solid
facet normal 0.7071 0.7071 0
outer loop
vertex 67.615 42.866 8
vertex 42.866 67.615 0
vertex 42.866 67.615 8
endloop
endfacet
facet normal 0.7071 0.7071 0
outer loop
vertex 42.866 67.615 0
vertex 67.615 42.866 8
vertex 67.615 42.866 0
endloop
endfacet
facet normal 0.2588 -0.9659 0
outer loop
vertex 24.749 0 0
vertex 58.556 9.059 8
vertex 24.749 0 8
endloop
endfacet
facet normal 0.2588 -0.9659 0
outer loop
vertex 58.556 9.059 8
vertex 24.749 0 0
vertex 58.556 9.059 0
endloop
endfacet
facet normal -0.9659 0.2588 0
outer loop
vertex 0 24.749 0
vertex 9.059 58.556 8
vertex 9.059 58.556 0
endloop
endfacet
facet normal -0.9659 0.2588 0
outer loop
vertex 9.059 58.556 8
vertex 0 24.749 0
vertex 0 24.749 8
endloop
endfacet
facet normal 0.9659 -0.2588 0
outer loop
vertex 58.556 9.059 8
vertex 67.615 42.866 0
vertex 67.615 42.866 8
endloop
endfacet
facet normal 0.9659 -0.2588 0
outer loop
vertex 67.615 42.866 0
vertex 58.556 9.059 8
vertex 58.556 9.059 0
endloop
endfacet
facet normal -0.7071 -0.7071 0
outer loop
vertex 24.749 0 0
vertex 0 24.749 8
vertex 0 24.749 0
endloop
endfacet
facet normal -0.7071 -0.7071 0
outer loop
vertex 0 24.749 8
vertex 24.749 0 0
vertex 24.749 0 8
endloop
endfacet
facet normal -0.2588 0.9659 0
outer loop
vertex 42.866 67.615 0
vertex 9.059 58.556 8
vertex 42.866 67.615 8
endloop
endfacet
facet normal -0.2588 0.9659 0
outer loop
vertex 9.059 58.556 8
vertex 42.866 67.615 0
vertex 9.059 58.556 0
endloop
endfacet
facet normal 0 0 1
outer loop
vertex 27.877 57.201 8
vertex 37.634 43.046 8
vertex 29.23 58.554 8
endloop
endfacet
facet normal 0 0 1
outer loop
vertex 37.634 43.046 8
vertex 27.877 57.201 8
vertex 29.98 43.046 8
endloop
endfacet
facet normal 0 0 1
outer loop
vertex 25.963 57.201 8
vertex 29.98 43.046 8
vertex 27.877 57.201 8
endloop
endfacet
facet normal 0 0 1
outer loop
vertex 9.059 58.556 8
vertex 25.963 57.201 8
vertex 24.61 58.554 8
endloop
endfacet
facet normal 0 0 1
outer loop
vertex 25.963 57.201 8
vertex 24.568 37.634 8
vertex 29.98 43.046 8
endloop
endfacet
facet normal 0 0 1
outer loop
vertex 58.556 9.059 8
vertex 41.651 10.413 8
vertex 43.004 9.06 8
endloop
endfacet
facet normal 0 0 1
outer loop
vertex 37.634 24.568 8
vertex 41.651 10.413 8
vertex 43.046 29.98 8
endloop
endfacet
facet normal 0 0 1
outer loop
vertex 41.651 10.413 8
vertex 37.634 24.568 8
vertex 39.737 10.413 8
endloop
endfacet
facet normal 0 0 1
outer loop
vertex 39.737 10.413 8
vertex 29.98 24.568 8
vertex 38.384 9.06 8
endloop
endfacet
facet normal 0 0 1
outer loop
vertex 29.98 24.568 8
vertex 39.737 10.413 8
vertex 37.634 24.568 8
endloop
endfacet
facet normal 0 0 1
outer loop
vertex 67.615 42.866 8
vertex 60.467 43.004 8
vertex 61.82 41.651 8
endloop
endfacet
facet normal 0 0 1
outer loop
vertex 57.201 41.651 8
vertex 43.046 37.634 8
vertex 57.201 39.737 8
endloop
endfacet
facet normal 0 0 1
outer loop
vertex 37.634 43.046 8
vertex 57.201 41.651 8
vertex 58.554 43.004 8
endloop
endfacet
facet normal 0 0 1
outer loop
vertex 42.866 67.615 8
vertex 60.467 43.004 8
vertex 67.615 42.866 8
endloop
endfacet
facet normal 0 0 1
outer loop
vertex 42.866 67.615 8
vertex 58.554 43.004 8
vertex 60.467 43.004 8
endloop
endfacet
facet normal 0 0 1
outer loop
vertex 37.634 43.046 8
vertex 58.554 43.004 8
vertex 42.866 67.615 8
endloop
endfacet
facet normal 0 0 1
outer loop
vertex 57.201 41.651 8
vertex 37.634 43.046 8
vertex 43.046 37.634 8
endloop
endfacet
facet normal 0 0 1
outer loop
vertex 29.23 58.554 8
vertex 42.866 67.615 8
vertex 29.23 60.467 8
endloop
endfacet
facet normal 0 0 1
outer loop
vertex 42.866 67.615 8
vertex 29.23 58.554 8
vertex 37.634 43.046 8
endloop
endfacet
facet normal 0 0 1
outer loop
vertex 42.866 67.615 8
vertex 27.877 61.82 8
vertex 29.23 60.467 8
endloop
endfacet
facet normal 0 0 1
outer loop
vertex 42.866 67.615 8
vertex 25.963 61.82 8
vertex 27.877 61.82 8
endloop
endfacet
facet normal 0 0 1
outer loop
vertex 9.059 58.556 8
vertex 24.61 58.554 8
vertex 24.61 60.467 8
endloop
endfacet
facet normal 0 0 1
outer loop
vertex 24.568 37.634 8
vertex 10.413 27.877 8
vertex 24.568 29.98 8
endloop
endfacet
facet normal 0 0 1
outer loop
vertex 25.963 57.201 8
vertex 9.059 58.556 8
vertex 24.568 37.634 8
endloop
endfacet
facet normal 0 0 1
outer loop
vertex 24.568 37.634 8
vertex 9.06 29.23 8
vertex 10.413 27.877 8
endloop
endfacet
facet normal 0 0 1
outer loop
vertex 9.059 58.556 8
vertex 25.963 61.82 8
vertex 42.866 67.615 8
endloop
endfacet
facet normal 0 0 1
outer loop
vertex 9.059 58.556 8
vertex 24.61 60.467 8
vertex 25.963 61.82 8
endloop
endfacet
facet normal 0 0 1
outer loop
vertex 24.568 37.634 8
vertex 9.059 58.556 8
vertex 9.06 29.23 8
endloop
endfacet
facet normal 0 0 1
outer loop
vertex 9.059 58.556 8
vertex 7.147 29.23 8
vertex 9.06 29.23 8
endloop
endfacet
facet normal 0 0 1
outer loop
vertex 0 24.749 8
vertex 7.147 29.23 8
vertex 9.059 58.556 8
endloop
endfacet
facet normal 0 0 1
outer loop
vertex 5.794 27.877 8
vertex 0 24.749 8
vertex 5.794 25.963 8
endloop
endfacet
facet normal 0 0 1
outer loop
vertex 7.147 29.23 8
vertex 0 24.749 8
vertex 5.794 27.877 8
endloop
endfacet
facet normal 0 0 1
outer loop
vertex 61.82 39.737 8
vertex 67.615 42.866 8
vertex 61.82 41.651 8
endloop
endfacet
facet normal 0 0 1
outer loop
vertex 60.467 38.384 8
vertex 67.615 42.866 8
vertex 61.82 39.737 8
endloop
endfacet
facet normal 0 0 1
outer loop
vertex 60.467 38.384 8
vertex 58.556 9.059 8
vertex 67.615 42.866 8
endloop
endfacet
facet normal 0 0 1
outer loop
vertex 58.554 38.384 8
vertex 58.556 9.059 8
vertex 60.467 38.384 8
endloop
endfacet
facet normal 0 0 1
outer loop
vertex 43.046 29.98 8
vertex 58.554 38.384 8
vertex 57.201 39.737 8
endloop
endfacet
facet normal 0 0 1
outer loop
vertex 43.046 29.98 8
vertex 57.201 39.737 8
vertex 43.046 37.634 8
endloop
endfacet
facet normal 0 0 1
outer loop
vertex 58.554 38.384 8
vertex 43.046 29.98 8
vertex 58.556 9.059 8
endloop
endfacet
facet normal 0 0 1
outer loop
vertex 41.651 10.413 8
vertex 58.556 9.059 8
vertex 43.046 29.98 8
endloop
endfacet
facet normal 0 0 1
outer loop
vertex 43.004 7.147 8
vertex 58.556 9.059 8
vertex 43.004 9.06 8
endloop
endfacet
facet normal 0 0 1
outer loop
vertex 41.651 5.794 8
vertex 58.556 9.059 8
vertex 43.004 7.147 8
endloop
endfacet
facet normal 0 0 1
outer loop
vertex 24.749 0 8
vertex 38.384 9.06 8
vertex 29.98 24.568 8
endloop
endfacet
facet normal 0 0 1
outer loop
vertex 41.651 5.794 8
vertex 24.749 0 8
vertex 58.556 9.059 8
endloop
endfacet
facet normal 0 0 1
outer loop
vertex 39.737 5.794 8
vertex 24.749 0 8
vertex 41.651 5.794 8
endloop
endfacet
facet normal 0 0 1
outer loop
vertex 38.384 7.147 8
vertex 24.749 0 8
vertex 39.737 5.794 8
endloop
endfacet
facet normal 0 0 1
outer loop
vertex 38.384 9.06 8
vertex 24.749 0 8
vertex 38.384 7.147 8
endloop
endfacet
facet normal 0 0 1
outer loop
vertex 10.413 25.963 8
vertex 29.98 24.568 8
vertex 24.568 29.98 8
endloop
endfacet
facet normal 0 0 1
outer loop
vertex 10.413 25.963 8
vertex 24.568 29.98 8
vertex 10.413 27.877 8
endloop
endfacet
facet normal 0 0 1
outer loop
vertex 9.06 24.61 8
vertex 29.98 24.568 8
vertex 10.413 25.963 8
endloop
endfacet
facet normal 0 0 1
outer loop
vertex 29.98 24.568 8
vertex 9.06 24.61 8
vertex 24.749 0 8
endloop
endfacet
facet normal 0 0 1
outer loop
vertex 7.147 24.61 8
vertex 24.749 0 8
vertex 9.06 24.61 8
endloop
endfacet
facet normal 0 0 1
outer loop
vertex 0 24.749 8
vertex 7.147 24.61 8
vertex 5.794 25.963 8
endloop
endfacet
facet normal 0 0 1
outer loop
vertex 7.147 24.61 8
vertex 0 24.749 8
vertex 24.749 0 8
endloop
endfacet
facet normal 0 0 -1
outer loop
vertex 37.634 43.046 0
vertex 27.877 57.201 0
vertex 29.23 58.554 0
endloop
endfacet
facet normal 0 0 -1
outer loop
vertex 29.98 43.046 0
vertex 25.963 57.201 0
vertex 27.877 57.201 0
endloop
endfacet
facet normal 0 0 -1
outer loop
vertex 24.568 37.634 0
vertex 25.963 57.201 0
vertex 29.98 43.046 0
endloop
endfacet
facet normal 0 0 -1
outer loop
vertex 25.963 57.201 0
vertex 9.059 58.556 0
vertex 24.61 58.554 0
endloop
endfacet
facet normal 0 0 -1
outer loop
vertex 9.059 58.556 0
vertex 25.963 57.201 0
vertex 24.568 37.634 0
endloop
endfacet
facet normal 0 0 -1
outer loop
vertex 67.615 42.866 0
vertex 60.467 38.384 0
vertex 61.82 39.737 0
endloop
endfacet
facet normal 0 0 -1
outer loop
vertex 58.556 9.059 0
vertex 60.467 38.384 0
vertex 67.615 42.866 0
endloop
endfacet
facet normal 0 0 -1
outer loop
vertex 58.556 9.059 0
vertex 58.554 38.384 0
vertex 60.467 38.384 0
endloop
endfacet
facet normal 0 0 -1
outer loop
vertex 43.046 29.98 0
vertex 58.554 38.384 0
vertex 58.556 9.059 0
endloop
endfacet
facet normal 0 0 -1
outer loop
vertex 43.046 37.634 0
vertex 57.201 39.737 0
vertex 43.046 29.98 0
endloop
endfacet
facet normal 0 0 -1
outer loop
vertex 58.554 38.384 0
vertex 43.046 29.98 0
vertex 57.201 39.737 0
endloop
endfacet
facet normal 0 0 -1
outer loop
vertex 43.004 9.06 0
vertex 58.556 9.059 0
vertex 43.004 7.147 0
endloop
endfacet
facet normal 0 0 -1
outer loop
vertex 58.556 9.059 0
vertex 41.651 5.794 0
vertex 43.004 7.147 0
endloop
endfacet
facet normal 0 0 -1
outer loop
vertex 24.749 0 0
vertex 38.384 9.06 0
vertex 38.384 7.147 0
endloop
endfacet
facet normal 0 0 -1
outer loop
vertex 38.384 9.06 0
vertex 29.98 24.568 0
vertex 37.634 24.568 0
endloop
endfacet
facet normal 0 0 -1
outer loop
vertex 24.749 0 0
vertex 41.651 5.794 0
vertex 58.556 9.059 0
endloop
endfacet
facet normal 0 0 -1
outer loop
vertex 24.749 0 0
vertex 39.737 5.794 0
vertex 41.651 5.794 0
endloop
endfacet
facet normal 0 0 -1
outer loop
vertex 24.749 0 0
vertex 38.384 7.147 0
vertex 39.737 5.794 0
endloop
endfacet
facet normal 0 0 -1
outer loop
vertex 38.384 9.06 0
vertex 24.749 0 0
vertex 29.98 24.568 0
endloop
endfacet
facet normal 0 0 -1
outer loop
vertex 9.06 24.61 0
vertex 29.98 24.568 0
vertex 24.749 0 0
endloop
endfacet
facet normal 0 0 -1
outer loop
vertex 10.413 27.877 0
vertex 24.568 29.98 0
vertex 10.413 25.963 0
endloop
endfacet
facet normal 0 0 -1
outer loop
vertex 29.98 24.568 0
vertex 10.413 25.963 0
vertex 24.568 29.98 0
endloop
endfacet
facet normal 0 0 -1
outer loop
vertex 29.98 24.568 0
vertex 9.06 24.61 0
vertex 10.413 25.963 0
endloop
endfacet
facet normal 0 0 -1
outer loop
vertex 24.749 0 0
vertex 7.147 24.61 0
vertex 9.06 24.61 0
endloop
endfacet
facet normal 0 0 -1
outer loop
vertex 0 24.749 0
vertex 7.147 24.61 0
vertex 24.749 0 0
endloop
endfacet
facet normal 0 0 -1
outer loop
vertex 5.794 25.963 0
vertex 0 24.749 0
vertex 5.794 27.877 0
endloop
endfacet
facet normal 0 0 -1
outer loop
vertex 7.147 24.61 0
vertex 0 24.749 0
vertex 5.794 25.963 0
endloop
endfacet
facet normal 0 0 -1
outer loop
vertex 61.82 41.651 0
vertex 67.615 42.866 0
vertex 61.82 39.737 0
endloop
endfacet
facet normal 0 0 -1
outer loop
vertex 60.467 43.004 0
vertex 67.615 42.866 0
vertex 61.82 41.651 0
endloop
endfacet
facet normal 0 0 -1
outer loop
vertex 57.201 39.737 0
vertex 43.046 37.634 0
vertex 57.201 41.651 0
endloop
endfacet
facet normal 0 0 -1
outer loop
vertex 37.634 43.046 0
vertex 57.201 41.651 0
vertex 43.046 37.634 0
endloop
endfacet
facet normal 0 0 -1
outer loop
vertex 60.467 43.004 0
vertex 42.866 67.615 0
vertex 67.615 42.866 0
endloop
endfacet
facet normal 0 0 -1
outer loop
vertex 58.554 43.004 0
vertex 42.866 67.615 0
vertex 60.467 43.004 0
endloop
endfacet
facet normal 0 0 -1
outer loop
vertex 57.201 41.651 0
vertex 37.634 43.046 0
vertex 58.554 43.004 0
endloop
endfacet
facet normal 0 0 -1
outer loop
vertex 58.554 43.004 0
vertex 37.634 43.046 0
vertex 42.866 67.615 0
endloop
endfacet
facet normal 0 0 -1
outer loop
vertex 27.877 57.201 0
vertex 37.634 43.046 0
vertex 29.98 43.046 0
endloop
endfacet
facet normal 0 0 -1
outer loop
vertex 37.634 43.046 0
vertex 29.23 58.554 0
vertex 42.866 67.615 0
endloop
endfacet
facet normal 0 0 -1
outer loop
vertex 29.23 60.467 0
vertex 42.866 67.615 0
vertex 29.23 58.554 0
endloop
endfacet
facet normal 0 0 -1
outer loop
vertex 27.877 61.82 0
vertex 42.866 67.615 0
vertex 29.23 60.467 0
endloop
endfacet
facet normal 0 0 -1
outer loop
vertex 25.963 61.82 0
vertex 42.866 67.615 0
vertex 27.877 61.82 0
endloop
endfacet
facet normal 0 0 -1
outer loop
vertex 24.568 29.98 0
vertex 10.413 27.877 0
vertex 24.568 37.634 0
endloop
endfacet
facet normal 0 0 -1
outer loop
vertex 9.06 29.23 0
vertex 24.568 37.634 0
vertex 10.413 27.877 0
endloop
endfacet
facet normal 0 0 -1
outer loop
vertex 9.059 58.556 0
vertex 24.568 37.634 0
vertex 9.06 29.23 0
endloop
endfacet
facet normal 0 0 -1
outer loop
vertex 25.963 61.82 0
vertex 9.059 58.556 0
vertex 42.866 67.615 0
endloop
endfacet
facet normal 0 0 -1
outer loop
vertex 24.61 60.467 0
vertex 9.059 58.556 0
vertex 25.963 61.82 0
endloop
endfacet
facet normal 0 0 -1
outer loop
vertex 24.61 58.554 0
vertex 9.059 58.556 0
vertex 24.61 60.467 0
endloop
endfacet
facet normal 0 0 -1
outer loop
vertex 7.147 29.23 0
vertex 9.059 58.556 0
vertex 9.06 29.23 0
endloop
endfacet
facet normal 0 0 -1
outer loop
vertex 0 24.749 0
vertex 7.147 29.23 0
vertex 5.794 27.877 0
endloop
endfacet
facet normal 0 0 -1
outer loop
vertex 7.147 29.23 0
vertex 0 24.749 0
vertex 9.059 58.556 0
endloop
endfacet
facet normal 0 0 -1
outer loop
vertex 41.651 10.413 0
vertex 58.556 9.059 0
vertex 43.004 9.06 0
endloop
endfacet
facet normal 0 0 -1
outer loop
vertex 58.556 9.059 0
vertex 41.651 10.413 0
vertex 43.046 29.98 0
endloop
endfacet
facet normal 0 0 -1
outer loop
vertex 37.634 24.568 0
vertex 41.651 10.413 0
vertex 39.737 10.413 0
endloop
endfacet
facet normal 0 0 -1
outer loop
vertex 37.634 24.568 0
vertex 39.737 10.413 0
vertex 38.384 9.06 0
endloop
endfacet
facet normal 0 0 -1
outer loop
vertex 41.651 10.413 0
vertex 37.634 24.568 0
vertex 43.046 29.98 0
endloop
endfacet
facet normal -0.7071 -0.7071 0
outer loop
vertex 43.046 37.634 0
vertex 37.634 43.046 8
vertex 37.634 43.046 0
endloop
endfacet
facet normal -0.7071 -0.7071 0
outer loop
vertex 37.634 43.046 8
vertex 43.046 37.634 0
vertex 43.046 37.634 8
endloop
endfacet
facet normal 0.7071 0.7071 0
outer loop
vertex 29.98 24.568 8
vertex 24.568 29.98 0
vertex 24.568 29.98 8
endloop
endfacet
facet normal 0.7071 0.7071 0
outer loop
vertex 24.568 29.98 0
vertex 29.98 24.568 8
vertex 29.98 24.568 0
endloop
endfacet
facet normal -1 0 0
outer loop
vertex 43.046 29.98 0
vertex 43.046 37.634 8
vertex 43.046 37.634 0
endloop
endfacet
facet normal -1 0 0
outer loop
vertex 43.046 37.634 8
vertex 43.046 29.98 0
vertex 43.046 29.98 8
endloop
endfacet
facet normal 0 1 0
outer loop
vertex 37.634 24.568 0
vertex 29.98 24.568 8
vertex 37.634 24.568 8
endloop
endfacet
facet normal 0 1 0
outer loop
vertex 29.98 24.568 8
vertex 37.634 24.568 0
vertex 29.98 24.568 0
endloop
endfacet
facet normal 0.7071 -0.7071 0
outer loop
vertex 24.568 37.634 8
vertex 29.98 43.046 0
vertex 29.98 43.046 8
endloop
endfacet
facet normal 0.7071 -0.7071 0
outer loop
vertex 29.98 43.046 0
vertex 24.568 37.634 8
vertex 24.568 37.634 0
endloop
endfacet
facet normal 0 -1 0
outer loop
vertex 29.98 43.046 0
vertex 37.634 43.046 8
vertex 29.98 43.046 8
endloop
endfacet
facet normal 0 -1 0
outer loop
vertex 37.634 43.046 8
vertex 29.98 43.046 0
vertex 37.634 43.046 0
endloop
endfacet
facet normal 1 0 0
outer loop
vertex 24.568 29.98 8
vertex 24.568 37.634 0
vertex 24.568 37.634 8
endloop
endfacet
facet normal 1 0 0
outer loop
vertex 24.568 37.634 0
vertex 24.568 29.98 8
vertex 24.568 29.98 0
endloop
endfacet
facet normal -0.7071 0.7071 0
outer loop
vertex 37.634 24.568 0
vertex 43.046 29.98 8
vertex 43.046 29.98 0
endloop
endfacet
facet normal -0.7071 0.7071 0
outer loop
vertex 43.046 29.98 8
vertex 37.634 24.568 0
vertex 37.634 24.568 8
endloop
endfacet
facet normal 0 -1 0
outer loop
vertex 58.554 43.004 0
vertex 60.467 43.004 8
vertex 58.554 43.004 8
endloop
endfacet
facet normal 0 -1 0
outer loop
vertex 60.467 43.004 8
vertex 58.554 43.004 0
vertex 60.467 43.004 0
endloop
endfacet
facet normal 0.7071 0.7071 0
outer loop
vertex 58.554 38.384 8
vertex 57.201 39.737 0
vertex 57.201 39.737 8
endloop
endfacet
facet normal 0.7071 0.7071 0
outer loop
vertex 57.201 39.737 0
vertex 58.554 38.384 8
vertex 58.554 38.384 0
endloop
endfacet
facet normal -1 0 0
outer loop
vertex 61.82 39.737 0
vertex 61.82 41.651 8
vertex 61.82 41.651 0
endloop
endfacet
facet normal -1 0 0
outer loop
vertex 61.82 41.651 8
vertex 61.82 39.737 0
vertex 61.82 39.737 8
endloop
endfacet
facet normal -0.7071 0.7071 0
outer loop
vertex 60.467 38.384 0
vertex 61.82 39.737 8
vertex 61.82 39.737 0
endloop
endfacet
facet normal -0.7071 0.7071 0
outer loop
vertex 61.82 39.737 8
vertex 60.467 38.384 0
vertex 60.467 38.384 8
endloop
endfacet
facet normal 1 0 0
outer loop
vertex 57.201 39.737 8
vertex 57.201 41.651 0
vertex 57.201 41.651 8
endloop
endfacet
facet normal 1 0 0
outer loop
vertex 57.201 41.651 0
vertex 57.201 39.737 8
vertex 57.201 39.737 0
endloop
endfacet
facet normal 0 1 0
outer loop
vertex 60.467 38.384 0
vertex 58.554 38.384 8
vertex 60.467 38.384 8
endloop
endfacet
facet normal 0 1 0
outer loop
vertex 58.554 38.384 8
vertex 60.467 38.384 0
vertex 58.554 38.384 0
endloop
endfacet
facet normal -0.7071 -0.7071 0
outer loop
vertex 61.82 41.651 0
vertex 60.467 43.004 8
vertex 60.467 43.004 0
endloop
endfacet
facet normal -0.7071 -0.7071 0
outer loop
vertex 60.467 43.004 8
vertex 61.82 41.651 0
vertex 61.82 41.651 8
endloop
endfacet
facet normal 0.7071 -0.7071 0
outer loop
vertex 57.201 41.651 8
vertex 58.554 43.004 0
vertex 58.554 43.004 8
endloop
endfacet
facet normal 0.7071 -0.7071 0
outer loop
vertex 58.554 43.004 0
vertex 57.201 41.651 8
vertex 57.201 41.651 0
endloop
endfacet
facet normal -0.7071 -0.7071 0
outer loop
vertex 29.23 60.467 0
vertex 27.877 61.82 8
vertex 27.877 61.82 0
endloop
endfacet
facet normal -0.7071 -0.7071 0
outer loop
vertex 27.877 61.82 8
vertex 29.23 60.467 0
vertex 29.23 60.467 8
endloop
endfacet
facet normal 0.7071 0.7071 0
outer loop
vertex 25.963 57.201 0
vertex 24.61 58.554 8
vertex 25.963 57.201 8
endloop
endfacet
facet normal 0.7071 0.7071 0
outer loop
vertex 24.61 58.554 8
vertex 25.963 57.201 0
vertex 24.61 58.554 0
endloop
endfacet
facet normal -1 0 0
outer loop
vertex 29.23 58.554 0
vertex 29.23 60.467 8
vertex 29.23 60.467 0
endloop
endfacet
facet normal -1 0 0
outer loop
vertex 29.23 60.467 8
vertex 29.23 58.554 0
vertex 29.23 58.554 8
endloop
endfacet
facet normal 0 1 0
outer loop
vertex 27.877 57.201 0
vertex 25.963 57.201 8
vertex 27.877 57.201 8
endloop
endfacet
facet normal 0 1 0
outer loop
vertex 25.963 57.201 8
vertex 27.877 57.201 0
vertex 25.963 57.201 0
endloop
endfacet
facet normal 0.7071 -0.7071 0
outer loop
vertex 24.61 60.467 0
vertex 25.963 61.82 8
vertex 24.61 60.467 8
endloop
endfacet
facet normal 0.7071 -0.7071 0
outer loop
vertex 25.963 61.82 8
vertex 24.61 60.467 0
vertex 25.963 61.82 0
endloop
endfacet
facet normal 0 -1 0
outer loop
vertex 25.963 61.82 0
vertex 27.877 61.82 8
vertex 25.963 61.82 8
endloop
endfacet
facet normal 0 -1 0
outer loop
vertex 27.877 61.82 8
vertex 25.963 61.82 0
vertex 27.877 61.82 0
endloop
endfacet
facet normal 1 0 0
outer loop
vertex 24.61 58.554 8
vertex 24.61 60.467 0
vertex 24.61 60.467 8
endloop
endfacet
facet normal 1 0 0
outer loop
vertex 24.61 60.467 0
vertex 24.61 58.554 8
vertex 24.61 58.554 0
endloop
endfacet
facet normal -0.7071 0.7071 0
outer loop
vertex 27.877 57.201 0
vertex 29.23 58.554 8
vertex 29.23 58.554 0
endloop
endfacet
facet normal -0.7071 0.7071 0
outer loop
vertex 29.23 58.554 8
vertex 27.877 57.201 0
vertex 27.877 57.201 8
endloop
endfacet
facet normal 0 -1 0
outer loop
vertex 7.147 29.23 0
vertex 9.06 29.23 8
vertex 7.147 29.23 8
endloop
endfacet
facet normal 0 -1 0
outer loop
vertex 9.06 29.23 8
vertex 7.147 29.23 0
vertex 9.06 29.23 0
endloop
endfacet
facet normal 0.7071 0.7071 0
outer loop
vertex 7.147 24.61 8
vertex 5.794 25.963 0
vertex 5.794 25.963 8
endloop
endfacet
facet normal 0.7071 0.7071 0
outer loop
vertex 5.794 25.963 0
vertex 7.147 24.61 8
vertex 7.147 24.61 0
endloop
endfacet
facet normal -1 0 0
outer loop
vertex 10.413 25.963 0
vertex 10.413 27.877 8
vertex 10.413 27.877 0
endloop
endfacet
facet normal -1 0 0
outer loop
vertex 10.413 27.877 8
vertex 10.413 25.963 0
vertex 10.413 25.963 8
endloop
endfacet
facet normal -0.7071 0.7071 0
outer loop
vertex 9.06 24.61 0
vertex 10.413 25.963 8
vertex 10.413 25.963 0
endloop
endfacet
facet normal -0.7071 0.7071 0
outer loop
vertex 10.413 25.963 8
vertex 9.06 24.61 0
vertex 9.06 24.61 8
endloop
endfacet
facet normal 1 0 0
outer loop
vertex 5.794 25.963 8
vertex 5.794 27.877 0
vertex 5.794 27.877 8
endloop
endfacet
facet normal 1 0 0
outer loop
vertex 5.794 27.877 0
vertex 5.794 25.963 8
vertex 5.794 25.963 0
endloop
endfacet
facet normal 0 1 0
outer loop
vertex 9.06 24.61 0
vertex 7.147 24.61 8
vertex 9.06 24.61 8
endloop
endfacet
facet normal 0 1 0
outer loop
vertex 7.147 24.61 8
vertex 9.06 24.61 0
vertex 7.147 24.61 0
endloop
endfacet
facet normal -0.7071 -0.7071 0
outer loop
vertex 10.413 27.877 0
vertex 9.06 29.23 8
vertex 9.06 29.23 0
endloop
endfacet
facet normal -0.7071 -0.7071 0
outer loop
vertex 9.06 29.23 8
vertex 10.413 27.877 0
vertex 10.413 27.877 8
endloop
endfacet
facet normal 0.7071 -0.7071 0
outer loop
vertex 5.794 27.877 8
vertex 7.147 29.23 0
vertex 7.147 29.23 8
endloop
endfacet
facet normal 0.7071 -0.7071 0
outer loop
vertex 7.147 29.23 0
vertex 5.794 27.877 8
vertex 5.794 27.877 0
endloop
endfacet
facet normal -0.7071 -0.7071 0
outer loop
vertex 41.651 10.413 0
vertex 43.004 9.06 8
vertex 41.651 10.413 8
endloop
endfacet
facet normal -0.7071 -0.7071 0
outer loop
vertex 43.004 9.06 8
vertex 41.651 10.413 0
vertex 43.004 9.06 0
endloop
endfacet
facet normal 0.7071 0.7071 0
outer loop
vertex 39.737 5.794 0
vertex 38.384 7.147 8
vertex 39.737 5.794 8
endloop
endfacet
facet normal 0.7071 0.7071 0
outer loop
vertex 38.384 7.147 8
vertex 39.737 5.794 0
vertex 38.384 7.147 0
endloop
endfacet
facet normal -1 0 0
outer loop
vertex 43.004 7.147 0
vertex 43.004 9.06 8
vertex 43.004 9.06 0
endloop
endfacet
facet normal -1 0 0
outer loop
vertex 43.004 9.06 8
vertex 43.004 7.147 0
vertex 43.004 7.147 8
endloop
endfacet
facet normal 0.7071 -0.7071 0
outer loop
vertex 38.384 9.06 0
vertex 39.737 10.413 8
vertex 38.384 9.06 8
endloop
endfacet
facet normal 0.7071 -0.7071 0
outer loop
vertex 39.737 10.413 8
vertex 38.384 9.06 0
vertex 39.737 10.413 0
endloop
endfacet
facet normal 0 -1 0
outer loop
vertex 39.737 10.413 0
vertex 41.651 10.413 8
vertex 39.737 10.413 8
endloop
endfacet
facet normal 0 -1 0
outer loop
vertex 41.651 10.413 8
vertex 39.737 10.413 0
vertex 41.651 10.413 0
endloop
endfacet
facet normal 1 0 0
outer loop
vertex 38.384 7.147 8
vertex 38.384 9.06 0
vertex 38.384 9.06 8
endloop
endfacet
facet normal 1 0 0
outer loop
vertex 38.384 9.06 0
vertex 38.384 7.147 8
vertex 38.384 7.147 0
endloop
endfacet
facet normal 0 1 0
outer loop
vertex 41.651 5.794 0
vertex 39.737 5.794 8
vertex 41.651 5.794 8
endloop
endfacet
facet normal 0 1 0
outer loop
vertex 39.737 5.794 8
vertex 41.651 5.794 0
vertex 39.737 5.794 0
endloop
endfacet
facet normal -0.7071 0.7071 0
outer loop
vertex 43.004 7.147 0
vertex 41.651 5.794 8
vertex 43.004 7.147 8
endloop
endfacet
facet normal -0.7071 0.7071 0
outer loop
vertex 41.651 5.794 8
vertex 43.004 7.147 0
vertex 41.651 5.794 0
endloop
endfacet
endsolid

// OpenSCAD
$fn = 32;

// ----------------------------------------------------------------------
// Polygon plate: 6-gon R35, 4 bolt windows
// ----------------------------------------------------------------------

// --- parameters (mm) ---
sides = 6;                // number of polygon sides
plate_r = 35;             // circumscribed radius of the polygon
bore_r = 10;              // centre bore radius
bolts = 4;                // number of bolt windows
ring_r = 26.61;           // bolt-circle radius
bolt_r = 2.5;             // bolt window radius
plate_t = 8;              // plate thickness, Z (extrusion height)

plate_d = 2 * plate_r;  // circumscribed diameter
bore_d = 2 * bore_r;  // centre bore diameter
bolt_d = 2 * bolt_r;  // bolt window diameter
ring_d = 2 * ring_r;  // bolt-circle diameter

profile = [[67.615, 42.866], [42.866, 67.615], [9.059, 58.556], [0, 24.749], [24.749, 0], [58.556, 9.059]];  // primary outline, 6 points, counter clockwise
void_1 = [[43.046, 37.634], [37.634, 43.046], [29.98, 43.046], [24.568, 37.634], [24.568, 29.98], [29.98, 24.568], [37.634, 24.568], [43.046, 29.98]];  // centre bore, 8 points
void_2 = [[61.82, 41.651], [60.467, 43.004], [58.554, 43.004], [57.201, 41.651], [57.201, 39.737], [58.554, 38.384], [60.467, 38.384], [61.82, 39.737]];  // bolt window 1, 8 points
void_3 = [[29.23, 60.467], [27.877, 61.82], [25.963, 61.82], [24.61, 60.467], [24.61, 58.554], [25.963, 57.201], [27.877, 57.201], [29.23, 58.554]];  // bolt window 2, 8 points
void_4 = [[10.413, 27.877], [9.06, 29.23], [7.147, 29.23], [5.794, 27.877], [5.794, 25.963], [7.147, 24.61], [9.06, 24.61], [10.413, 25.963]];  // bolt window 3, 8 points
void_5 = [[43.004, 9.06], [41.651, 10.413], [39.737, 10.413], [38.384, 9.06], [38.384, 7.147], [39.737, 5.794], [41.651, 5.794], [43.004, 7.147]];  // bolt window 4, 8 points

// --- the one profile operation ---
difference() {
  linear_extrude(height = plate_t) polygon(points = profile);
  translate([0, 0, -1])
    linear_extrude(height = plate_t + 2) polygon(points = void_1);
  translate([0, 0, -1])
    linear_extrude(height = plate_t + 2) polygon(points = void_2);
  translate([0, 0, -1])
    linear_extrude(height = plate_t + 2) polygon(points = void_3);
  translate([0, 0, -1])
    linear_extrude(height = plate_t + 2) polygon(points = void_4);
  translate([0, 0, -1])
    linear_extrude(height = plate_t + 2) polygon(points = void_5);
}
